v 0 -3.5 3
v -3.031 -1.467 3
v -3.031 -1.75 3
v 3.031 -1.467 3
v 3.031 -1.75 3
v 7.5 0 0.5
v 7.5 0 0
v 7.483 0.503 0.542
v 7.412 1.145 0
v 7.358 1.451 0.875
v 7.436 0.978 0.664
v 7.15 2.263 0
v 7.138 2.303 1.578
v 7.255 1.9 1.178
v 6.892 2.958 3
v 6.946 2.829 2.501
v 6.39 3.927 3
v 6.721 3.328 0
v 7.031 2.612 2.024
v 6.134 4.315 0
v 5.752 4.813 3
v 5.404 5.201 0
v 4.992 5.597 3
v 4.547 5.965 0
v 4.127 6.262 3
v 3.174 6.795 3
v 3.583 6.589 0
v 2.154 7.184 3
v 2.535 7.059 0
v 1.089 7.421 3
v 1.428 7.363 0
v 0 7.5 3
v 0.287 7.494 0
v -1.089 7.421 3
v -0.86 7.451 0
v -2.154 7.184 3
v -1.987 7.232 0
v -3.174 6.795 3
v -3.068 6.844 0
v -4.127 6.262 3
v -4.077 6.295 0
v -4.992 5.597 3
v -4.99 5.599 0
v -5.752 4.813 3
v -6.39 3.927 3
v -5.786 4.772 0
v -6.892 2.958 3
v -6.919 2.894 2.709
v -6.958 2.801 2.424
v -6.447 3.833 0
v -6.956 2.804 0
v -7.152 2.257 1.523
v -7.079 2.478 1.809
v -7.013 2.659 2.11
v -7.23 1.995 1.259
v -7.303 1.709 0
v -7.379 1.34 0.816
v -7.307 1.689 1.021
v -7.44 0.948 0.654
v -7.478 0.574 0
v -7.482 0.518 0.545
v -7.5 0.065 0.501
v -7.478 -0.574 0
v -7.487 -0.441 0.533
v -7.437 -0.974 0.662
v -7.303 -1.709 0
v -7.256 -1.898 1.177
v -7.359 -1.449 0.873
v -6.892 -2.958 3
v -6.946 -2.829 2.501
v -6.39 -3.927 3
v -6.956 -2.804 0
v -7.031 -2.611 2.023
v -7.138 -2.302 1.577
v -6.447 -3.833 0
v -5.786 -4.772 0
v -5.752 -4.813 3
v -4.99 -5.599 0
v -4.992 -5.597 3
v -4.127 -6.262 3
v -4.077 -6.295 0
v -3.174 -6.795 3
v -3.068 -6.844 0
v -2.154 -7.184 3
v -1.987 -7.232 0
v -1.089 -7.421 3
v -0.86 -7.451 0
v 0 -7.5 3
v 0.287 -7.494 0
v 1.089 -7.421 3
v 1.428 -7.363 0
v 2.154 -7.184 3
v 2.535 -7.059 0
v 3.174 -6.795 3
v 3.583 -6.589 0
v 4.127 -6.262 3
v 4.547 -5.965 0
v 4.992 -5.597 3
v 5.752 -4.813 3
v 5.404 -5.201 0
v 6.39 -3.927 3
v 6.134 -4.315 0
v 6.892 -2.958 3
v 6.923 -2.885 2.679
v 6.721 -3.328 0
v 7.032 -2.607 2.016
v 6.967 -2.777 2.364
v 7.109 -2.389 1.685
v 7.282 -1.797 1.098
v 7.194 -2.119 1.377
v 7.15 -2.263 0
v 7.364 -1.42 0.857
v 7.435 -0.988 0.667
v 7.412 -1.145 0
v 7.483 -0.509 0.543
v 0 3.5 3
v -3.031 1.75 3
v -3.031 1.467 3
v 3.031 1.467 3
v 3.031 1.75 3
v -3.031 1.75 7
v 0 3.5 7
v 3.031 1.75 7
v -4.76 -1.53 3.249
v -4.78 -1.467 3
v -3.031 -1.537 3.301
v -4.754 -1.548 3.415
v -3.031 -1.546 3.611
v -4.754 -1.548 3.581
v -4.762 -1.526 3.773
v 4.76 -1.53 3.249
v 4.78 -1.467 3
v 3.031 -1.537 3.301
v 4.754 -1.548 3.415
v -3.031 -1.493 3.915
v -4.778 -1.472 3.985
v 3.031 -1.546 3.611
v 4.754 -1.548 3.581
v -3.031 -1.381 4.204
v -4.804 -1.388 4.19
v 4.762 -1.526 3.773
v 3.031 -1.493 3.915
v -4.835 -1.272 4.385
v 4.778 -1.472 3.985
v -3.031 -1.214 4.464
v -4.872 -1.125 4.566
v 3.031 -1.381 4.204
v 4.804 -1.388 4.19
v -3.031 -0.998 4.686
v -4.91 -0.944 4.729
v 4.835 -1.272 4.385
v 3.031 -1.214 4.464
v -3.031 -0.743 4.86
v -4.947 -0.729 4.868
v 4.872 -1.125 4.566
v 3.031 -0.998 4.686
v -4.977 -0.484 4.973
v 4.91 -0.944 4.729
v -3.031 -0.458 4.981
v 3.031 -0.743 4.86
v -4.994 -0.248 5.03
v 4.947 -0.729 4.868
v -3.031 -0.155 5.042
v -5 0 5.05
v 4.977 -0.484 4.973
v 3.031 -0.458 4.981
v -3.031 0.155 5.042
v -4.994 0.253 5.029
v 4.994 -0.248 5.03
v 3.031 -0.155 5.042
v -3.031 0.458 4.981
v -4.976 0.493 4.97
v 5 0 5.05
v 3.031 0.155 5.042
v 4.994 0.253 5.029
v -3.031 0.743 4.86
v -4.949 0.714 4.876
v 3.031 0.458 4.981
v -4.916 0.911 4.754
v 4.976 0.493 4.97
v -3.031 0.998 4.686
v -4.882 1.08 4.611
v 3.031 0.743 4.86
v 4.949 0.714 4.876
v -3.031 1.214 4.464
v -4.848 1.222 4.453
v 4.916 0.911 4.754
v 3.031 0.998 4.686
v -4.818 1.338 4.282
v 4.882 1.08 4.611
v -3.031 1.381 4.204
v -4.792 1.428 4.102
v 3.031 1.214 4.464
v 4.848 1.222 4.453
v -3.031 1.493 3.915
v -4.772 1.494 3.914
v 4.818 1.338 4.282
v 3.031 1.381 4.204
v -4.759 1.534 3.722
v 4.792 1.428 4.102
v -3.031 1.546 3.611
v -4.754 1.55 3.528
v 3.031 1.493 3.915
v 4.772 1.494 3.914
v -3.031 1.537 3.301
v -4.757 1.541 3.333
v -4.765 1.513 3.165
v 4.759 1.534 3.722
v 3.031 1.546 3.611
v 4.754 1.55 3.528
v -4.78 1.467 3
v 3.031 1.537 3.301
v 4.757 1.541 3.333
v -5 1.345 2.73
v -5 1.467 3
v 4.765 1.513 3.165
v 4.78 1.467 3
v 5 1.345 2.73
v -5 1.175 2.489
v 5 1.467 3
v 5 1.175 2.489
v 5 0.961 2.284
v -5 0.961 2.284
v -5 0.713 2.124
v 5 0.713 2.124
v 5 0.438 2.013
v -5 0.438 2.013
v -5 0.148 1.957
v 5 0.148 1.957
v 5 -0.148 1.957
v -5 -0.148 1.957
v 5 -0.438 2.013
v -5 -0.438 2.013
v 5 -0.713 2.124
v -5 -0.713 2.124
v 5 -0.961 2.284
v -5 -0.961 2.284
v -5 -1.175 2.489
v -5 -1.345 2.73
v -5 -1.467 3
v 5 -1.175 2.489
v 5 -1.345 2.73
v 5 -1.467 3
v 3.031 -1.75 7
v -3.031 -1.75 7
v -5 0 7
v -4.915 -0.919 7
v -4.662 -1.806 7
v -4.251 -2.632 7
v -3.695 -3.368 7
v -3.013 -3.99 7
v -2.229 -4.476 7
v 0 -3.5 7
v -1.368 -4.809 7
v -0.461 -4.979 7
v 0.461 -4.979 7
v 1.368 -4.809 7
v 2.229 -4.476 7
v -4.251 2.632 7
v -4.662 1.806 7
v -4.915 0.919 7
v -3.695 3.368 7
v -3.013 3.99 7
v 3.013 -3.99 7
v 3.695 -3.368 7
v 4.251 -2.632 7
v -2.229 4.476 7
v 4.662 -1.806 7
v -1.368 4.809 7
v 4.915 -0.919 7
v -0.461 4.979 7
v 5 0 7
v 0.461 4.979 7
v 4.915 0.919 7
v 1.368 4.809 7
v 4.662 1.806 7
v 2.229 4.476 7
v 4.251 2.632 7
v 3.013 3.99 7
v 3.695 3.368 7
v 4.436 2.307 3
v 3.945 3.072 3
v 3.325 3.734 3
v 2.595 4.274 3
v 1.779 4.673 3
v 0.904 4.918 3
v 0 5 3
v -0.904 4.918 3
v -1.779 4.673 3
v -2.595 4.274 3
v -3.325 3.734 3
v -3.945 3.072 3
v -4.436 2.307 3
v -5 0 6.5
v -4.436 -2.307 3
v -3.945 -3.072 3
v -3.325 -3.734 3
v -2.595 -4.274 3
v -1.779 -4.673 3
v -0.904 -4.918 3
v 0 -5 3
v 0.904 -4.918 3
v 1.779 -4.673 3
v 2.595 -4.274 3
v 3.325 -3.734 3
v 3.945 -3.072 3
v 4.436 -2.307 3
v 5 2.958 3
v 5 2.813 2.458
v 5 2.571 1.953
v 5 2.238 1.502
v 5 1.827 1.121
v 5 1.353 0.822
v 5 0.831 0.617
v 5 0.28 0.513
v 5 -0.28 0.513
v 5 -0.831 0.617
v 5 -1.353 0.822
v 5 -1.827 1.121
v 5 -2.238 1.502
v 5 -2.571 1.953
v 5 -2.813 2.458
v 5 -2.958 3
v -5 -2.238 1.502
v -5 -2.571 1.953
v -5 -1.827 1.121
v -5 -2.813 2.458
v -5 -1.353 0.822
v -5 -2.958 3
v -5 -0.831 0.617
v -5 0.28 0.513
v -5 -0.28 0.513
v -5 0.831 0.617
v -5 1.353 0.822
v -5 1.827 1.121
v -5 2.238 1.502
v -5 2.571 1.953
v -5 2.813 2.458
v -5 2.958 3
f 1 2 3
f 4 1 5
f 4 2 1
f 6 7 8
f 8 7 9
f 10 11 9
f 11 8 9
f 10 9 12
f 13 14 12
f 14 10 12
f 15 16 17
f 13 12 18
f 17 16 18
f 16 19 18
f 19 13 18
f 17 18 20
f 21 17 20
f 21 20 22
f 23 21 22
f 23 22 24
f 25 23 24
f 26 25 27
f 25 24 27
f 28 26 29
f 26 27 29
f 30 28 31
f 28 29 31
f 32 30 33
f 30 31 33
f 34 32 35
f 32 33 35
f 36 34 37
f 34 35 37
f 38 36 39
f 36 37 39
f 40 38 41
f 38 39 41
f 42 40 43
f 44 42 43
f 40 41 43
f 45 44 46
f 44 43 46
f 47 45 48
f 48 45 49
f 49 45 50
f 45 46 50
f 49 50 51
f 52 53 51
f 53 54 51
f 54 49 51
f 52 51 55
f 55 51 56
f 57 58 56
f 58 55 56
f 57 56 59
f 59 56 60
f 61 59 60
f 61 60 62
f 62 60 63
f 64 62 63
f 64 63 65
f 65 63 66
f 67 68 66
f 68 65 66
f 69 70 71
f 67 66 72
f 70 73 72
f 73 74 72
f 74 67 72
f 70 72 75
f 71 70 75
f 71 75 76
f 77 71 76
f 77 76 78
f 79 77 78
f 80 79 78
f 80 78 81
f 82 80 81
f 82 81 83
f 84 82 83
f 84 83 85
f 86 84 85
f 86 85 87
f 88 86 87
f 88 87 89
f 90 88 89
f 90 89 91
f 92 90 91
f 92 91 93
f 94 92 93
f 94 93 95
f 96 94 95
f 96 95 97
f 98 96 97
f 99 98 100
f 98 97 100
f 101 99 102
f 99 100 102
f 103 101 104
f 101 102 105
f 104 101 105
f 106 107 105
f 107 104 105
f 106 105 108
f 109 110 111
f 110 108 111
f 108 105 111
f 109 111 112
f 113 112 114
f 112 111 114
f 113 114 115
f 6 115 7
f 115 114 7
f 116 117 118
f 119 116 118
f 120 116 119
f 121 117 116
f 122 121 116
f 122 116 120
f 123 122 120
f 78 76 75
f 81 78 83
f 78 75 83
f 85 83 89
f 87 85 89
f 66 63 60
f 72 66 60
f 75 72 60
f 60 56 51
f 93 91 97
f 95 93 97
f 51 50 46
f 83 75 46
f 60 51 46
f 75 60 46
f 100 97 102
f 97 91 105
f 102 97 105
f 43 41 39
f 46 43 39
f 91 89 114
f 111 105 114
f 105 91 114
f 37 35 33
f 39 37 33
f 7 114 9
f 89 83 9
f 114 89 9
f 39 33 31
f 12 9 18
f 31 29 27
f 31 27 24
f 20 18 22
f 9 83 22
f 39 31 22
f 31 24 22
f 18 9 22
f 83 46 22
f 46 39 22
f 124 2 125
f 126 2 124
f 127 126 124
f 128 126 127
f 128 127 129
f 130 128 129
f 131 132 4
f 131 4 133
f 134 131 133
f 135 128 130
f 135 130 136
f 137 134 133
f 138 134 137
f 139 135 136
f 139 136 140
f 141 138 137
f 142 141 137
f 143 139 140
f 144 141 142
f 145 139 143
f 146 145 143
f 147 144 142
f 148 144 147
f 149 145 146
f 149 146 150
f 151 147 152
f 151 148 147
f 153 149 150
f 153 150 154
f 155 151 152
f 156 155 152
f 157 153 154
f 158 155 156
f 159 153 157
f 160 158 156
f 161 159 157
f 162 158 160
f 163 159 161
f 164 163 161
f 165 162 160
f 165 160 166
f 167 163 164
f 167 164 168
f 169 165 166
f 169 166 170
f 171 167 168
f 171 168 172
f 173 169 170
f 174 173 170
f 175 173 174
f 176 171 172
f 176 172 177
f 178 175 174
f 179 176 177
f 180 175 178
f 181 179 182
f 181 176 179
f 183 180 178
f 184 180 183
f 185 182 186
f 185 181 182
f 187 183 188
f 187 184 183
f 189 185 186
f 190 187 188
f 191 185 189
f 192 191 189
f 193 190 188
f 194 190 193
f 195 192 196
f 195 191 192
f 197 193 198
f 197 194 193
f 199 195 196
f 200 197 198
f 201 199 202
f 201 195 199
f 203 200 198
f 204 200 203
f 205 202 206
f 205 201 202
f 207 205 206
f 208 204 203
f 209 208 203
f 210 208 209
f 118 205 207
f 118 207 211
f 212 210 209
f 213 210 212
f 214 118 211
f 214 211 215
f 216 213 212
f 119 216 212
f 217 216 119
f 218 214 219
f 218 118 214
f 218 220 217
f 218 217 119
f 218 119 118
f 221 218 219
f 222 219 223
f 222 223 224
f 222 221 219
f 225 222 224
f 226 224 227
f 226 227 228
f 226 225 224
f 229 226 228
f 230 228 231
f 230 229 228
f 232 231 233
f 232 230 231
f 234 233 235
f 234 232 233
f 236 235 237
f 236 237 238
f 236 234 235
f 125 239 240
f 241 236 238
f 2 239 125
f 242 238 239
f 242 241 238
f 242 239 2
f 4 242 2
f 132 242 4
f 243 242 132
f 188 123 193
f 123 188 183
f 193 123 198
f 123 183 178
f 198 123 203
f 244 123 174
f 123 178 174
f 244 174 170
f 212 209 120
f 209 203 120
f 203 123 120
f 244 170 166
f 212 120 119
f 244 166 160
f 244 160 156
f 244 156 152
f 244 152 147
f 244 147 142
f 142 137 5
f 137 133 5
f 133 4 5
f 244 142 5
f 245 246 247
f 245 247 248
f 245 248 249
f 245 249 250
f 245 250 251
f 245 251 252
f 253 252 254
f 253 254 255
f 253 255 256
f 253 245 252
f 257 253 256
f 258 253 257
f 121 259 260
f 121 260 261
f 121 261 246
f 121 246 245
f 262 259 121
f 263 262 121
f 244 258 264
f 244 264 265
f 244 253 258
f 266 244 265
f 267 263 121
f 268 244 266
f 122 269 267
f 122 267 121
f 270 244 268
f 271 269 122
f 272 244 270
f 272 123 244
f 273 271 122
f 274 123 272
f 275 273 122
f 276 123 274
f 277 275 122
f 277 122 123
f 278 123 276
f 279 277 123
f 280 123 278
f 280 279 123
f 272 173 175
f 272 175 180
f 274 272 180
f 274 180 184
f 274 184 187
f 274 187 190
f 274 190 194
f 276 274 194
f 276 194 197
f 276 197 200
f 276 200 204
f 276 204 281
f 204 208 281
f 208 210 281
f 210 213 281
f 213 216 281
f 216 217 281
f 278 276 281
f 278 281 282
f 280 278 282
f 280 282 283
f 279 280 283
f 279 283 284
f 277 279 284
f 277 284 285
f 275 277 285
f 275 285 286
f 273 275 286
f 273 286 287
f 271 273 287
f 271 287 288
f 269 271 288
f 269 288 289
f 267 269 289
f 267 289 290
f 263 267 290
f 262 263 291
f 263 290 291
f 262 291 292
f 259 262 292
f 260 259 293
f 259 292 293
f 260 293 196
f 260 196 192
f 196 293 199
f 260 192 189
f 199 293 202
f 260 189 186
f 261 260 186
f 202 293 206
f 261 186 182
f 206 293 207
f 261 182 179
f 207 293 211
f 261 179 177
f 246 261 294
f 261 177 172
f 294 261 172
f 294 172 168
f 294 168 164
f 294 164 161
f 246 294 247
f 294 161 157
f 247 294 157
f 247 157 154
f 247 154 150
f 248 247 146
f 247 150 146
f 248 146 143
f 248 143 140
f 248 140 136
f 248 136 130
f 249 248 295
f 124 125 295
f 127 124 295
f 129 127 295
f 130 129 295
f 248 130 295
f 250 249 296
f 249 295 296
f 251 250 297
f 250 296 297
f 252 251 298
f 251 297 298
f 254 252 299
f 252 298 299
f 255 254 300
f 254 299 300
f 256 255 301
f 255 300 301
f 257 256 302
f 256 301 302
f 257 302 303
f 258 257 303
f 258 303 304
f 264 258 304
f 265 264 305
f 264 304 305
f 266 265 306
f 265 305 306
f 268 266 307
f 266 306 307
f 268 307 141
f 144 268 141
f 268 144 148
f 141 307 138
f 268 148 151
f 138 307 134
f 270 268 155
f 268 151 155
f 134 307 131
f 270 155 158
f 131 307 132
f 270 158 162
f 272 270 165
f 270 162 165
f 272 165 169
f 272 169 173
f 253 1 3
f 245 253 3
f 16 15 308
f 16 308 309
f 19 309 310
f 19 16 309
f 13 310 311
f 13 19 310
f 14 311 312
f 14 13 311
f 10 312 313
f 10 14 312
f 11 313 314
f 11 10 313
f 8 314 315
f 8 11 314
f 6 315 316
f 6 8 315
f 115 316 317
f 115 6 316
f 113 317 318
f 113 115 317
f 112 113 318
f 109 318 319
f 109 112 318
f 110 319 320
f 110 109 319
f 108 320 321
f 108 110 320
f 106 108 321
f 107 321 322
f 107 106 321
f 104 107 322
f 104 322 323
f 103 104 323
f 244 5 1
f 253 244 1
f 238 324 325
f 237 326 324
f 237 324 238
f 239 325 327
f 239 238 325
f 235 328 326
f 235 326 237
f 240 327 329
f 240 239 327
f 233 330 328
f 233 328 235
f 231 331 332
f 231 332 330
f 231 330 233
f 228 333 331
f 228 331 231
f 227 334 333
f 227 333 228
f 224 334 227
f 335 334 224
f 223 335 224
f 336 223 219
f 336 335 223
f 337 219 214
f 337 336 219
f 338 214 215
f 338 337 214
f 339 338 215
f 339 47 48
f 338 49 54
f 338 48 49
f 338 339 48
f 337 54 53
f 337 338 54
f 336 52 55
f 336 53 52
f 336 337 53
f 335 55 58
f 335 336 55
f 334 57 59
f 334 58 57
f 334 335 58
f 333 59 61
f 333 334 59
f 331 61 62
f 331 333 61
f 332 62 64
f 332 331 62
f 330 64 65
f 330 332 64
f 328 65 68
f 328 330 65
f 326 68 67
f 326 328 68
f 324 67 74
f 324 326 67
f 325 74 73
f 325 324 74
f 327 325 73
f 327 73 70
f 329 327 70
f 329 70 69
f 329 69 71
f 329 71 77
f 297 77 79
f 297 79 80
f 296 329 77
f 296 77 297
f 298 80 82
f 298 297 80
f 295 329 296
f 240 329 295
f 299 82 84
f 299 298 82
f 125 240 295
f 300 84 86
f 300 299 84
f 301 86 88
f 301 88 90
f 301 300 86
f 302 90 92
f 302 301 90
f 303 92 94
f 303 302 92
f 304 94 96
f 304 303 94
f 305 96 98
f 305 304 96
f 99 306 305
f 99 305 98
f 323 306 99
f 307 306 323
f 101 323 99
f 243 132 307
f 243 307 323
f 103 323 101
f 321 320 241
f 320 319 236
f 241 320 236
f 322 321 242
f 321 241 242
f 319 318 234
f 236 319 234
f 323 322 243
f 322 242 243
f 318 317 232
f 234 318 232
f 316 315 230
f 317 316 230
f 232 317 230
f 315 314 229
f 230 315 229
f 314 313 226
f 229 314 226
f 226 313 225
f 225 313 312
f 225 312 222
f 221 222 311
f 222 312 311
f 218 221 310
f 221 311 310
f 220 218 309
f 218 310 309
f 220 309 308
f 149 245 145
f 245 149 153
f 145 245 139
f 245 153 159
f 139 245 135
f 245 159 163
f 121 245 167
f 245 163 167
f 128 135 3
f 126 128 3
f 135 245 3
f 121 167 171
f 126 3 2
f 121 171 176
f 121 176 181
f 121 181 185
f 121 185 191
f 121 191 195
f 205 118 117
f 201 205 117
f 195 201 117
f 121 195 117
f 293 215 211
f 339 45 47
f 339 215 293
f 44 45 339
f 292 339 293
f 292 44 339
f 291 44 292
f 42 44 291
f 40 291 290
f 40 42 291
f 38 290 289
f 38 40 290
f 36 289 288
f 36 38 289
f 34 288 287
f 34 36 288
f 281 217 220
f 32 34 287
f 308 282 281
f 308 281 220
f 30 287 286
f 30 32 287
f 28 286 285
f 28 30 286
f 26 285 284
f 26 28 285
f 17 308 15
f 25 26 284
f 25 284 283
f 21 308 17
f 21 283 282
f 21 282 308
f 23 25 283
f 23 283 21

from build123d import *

# Parameters (mm, degrees)
SKETCH1_R               = 5
BOSS_EXTRUDE2_DEPTH     = 7
SKETCH3_R               = 7.5
BOSS_EXTRUDE3_DEPTH     = 3
CUT_EXTRUDE1_DEPTH      = 5
CUT_EXTRUDE1_DEPTH_BACK = 5
SKETCH2_R               = 1.55
SKETCH4_R               = 3
CUT_EXTRUDE2_DEPTH      = 2.5
CUT_EXTRUDE3_START      = -2.5
SKETCH5_R               = 3
CUT_EXTRUDE3_DEPTH      = 2.5


with BuildPart() as part:
    # Sketch1 → Boss-Extrude2 (new body)
    with BuildSketch(Plane.XY):
        Circle(SKETCH1_R)
        Polygon((-3.031088913, 1.75), (0, 3.5), (3.031088913, 1.75), (3.031088913, -1.75), (0, -3.5), (-3.031088913, -1.75), align=None, mode=Mode.SUBTRACT)
    extrude(amount=BOSS_EXTRUDE2_DEPTH)

    # Sketch3 → Boss-Extrude3 (add)
    with BuildSketch(Plane.XY):
        Circle(SKETCH3_R)
    extrude(amount=BOSS_EXTRUDE3_DEPTH)

    # Sketch2 → Cut-Extrude1 (cut, two sides: drawn at the far end of the back side and taken through both)
    with BuildSketch(Plane.ZY.offset(-CUT_EXTRUDE1_DEPTH_BACK)):
        with Locations(Location((3.5, 0, 0), (0, 0, 251.180936631))):
            Circle(SKETCH2_R)
    extrude(amount=CUT_EXTRUDE1_DEPTH + CUT_EXTRUDE1_DEPTH_BACK, mode=Mode.SUBTRACT)

    # Sketch4 → Cut-Extrude2 (cut)
    with BuildSketch(Plane.ZY.offset(5)):
        with Locations((3.5, 0)):
            Circle(SKETCH4_R)
    extrude(amount=CUT_EXTRUDE2_DEPTH, mode=Mode.SUBTRACT)

    # Sketch5 → Cut-Extrude3 (cut)
    with BuildSketch(Plane.ZY.offset(-5).offset(CUT_EXTRUDE3_START)):
        with Locations((3.5, 0)):
            Circle(SKETCH5_R)
    extrude(amount=CUT_EXTRUDE3_DEPTH, mode=Mode.SUBTRACT)


solid = part.part
